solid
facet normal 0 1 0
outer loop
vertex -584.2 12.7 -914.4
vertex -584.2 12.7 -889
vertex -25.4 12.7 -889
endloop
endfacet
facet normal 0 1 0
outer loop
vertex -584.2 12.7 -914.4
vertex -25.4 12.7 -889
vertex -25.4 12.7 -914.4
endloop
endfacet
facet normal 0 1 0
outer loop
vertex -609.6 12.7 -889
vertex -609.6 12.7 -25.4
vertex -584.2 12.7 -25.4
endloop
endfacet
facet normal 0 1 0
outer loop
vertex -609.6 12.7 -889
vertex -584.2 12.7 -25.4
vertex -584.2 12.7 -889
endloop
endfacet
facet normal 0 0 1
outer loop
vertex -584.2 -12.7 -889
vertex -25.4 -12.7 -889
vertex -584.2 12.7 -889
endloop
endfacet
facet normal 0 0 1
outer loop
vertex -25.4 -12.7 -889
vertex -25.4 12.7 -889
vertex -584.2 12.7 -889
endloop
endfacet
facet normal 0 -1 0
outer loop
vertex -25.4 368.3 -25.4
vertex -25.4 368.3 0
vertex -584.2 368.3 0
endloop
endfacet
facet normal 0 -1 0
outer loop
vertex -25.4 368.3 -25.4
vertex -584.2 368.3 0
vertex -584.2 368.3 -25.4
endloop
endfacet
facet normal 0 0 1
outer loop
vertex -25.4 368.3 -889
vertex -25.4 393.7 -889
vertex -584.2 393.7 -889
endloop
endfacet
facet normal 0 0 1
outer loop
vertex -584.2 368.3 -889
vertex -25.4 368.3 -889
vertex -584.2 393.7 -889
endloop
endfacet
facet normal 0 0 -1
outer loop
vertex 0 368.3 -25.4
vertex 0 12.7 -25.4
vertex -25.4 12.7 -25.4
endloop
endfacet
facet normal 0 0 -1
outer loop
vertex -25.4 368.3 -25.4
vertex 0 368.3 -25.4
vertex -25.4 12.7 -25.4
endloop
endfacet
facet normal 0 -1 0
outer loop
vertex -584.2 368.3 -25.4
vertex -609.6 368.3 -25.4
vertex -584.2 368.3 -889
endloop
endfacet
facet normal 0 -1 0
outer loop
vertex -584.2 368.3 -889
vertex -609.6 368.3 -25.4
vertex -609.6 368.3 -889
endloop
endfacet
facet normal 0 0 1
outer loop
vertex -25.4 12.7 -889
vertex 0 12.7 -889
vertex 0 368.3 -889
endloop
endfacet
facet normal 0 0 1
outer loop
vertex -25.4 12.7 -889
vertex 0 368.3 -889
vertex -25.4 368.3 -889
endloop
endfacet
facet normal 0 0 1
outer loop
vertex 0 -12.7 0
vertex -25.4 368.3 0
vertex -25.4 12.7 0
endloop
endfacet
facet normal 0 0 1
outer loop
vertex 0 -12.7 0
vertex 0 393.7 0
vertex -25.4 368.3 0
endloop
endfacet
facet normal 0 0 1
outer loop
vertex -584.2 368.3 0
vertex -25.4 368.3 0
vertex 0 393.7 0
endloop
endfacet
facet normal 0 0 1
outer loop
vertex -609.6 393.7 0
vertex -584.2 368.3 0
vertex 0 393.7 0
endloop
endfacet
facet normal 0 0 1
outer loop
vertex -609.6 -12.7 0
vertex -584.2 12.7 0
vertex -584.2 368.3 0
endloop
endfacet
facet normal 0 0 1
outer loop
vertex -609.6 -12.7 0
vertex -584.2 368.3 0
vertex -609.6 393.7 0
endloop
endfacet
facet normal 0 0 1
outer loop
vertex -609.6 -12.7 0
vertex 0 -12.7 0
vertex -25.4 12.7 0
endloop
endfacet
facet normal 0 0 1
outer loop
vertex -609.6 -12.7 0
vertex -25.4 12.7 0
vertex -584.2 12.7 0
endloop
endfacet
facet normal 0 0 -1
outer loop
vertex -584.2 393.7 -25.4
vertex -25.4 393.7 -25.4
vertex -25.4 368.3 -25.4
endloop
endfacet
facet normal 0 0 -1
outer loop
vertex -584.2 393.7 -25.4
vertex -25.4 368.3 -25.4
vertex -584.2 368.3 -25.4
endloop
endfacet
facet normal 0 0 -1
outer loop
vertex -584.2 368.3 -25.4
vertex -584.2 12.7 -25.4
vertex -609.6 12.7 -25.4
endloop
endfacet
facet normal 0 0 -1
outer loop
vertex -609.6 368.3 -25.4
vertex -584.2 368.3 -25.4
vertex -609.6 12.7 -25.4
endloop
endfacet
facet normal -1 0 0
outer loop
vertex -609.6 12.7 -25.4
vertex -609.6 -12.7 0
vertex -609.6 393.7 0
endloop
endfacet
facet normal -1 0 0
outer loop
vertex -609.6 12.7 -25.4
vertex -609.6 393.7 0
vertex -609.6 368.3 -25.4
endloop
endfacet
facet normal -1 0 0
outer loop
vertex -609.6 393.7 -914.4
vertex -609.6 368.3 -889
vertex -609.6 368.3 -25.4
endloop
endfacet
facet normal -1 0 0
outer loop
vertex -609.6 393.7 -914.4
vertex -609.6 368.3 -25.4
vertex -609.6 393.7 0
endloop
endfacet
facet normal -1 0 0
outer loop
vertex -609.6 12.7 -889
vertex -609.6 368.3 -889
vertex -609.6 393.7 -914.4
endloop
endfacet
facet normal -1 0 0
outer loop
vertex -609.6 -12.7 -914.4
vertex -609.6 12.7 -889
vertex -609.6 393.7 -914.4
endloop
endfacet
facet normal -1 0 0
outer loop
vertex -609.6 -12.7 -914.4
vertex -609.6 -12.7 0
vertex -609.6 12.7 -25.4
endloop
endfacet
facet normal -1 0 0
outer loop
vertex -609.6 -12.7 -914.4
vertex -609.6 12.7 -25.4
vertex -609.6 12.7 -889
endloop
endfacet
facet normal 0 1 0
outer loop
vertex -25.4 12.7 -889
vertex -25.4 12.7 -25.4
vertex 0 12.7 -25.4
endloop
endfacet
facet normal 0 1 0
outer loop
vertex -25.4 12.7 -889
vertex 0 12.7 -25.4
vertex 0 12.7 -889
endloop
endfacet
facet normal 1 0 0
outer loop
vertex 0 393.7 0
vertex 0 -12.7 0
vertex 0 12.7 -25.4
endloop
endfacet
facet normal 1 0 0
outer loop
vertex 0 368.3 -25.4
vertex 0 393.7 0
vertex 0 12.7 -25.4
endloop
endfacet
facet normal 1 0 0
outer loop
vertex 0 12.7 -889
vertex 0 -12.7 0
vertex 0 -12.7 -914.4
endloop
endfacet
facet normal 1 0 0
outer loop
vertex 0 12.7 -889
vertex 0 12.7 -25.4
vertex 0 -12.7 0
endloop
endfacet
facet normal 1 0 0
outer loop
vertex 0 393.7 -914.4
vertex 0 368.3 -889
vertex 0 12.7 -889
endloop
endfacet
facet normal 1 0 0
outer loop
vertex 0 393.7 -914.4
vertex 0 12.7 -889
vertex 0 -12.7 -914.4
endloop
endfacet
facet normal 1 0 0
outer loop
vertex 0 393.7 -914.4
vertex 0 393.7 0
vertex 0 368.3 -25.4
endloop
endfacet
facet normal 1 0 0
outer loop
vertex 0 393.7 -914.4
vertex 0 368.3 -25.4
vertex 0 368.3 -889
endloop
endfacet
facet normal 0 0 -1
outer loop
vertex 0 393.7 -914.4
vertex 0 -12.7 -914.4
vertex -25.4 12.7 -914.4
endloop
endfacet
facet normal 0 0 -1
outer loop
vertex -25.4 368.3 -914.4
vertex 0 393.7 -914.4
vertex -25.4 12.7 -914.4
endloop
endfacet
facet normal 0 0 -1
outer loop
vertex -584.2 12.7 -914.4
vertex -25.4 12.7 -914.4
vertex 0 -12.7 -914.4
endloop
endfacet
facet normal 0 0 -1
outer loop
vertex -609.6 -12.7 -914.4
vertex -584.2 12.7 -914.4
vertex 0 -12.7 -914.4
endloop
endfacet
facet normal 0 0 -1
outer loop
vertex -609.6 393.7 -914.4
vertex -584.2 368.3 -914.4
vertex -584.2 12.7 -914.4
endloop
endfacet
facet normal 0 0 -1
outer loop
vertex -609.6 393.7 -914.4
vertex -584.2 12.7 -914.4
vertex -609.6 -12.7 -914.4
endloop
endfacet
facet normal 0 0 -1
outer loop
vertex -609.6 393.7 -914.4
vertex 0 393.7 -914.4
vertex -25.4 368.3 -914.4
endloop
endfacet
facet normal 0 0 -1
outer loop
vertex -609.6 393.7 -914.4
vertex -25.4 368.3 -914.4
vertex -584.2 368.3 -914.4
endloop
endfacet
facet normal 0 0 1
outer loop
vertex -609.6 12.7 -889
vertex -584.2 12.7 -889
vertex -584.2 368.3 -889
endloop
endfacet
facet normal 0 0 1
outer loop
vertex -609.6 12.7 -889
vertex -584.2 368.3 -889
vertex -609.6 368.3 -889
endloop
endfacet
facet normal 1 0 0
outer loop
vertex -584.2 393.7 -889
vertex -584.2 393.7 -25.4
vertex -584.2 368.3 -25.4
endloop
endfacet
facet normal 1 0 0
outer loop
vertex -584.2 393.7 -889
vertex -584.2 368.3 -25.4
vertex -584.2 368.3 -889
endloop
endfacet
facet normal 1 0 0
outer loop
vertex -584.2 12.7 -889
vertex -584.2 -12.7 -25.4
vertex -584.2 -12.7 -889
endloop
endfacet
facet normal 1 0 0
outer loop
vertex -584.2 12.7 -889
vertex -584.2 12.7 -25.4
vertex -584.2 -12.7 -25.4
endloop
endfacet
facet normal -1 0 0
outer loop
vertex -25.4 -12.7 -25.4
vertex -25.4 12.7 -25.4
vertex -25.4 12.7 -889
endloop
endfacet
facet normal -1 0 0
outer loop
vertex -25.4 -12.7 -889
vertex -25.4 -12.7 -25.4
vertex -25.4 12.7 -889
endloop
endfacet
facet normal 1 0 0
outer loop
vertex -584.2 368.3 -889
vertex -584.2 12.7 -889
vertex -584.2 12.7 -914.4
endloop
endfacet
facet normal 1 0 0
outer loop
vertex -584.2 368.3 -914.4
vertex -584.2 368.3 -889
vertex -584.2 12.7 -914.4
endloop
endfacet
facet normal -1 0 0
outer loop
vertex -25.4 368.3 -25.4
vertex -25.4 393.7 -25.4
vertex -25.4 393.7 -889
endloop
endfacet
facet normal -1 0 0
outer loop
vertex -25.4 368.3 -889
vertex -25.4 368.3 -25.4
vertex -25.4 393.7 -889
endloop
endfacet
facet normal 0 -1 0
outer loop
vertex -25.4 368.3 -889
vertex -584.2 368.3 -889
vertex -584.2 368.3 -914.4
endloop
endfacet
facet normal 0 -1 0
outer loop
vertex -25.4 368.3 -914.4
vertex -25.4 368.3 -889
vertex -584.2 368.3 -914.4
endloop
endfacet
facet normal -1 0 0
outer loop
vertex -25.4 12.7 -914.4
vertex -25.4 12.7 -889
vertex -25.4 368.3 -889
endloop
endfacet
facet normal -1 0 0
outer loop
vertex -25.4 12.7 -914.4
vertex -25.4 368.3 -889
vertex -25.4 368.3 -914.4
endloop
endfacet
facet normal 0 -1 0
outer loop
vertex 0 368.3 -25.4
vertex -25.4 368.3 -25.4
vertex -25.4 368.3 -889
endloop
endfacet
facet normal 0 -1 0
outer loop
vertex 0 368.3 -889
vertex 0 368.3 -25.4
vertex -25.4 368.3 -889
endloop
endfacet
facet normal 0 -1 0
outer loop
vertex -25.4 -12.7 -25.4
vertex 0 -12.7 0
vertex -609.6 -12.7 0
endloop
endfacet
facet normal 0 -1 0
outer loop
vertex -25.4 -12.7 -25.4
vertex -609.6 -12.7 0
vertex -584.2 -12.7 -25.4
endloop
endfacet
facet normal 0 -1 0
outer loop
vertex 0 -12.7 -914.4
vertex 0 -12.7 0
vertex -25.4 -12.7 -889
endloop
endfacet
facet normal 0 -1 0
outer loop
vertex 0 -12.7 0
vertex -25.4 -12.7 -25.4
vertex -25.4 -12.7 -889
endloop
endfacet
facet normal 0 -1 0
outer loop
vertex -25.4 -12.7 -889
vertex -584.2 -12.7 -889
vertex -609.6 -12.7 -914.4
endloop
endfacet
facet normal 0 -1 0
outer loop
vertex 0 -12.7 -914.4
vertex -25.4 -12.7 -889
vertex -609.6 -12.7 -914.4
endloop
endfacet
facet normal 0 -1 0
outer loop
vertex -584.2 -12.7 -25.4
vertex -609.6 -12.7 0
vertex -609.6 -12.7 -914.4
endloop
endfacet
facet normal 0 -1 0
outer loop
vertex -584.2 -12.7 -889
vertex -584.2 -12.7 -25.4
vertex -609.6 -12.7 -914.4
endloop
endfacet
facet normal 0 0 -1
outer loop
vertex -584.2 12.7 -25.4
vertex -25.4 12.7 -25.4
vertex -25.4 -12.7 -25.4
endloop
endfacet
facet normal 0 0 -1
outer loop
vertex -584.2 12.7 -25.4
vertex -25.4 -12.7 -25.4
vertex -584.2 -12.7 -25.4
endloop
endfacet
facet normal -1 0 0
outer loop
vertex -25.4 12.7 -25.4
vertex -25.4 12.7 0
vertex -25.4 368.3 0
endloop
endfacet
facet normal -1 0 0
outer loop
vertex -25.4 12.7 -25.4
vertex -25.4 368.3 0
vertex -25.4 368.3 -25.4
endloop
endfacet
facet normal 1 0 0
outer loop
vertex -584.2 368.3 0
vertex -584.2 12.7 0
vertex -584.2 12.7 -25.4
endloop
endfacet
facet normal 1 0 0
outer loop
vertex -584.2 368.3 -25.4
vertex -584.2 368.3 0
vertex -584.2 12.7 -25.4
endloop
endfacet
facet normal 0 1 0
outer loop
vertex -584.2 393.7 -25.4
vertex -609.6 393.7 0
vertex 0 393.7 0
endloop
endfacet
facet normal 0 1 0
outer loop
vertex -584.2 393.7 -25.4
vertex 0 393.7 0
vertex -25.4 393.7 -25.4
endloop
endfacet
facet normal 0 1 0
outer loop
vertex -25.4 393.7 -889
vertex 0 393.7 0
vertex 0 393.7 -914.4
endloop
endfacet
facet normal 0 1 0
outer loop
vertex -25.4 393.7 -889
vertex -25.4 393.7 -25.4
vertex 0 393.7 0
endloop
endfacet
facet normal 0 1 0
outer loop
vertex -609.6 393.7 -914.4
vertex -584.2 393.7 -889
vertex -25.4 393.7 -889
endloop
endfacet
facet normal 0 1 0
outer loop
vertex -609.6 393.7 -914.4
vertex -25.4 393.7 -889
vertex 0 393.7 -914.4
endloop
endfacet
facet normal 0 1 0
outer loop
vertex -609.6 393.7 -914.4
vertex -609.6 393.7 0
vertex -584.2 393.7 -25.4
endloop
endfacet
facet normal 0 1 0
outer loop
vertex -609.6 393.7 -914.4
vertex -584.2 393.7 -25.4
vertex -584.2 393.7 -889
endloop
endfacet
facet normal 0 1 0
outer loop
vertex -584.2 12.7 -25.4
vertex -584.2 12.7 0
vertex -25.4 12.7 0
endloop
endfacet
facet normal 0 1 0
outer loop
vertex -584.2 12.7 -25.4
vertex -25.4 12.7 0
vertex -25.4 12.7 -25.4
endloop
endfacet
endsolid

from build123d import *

# Parameters (mm, degrees)
SKETCH1_W           = 914.4
SKETCH1_H           = 609.6
SKETCH1_W_2         = 863.6
SKETCH1_H_2         = 558.8
BOSS_EXTRUDE1_DEPTH = 12.7
SKETCH2_W           = 25.4
SKETCH2_H           = 25.4
BOSS_EXTRUDE2_DEPTH = 381
SKETCH3_W           = 914.4
SKETCH3_H           = 609.6
SKETCH3_W_2         = 863.6
SKETCH3_H_2         = 558.8
BOSS_EXTRUDE3_DEPTH = 25.4


with BuildPart() as part:
    # Sketch1 → Boss-Extrude1 (new body, symmetric)
    with BuildSketch(Plane(origin=(0, 0, 0), x_dir=(0, 0, -1), z_dir=(0, 1, 0))):
        with Locations((457.2, 304.8)):
            Rectangle(SKETCH1_W, SKETCH1_H)
        with Locations((457.2, 304.8)):
            Rectangle(SKETCH1_W_2, SKETCH1_H_2, mode=Mode.SUBTRACT)
    extrude(amount=BOSS_EXTRUDE1_DEPTH, both=True)

    # Sketch2 → Boss-Extrude2 (add)
    with BuildSketch(Plane(origin=(0, 12.7, 0), x_dir=(0, 0, -1), z_dir=(0, 1, 0))):
        with Locations((12.7, 596.9)):
            Rectangle(SKETCH2_W, SKETCH2_H)
        with Locations((901.7, 596.9)):
            Rectangle(SKETCH2_W, SKETCH2_H)
        with Locations((901.7, 12.7)):
            Rectangle(SKETCH2_W, SKETCH2_H)
        with Locations((12.7, 12.7)):
            Rectangle(SKETCH2_W, SKETCH2_H)
    extrude(amount=BOSS_EXTRUDE2_DEPTH)

    # Sketch3 → Boss-Extrude3 (add)
    with BuildSketch(Plane(origin=(0, 393.7, 0), x_dir=(0, 0, -1), z_dir=(0, 1, 0))):
        with Locations((457.2, 304.8)):
            Rectangle(SKETCH3_W, SKETCH3_H)
        with Locations((457.2, 304.8)):
            Rectangle(SKETCH3_W_2, SKETCH3_H_2, mode=Mode.SUBTRACT)
    extrude(amount=-BOSS_EXTRUDE3_DEPTH)


solid = part.part
